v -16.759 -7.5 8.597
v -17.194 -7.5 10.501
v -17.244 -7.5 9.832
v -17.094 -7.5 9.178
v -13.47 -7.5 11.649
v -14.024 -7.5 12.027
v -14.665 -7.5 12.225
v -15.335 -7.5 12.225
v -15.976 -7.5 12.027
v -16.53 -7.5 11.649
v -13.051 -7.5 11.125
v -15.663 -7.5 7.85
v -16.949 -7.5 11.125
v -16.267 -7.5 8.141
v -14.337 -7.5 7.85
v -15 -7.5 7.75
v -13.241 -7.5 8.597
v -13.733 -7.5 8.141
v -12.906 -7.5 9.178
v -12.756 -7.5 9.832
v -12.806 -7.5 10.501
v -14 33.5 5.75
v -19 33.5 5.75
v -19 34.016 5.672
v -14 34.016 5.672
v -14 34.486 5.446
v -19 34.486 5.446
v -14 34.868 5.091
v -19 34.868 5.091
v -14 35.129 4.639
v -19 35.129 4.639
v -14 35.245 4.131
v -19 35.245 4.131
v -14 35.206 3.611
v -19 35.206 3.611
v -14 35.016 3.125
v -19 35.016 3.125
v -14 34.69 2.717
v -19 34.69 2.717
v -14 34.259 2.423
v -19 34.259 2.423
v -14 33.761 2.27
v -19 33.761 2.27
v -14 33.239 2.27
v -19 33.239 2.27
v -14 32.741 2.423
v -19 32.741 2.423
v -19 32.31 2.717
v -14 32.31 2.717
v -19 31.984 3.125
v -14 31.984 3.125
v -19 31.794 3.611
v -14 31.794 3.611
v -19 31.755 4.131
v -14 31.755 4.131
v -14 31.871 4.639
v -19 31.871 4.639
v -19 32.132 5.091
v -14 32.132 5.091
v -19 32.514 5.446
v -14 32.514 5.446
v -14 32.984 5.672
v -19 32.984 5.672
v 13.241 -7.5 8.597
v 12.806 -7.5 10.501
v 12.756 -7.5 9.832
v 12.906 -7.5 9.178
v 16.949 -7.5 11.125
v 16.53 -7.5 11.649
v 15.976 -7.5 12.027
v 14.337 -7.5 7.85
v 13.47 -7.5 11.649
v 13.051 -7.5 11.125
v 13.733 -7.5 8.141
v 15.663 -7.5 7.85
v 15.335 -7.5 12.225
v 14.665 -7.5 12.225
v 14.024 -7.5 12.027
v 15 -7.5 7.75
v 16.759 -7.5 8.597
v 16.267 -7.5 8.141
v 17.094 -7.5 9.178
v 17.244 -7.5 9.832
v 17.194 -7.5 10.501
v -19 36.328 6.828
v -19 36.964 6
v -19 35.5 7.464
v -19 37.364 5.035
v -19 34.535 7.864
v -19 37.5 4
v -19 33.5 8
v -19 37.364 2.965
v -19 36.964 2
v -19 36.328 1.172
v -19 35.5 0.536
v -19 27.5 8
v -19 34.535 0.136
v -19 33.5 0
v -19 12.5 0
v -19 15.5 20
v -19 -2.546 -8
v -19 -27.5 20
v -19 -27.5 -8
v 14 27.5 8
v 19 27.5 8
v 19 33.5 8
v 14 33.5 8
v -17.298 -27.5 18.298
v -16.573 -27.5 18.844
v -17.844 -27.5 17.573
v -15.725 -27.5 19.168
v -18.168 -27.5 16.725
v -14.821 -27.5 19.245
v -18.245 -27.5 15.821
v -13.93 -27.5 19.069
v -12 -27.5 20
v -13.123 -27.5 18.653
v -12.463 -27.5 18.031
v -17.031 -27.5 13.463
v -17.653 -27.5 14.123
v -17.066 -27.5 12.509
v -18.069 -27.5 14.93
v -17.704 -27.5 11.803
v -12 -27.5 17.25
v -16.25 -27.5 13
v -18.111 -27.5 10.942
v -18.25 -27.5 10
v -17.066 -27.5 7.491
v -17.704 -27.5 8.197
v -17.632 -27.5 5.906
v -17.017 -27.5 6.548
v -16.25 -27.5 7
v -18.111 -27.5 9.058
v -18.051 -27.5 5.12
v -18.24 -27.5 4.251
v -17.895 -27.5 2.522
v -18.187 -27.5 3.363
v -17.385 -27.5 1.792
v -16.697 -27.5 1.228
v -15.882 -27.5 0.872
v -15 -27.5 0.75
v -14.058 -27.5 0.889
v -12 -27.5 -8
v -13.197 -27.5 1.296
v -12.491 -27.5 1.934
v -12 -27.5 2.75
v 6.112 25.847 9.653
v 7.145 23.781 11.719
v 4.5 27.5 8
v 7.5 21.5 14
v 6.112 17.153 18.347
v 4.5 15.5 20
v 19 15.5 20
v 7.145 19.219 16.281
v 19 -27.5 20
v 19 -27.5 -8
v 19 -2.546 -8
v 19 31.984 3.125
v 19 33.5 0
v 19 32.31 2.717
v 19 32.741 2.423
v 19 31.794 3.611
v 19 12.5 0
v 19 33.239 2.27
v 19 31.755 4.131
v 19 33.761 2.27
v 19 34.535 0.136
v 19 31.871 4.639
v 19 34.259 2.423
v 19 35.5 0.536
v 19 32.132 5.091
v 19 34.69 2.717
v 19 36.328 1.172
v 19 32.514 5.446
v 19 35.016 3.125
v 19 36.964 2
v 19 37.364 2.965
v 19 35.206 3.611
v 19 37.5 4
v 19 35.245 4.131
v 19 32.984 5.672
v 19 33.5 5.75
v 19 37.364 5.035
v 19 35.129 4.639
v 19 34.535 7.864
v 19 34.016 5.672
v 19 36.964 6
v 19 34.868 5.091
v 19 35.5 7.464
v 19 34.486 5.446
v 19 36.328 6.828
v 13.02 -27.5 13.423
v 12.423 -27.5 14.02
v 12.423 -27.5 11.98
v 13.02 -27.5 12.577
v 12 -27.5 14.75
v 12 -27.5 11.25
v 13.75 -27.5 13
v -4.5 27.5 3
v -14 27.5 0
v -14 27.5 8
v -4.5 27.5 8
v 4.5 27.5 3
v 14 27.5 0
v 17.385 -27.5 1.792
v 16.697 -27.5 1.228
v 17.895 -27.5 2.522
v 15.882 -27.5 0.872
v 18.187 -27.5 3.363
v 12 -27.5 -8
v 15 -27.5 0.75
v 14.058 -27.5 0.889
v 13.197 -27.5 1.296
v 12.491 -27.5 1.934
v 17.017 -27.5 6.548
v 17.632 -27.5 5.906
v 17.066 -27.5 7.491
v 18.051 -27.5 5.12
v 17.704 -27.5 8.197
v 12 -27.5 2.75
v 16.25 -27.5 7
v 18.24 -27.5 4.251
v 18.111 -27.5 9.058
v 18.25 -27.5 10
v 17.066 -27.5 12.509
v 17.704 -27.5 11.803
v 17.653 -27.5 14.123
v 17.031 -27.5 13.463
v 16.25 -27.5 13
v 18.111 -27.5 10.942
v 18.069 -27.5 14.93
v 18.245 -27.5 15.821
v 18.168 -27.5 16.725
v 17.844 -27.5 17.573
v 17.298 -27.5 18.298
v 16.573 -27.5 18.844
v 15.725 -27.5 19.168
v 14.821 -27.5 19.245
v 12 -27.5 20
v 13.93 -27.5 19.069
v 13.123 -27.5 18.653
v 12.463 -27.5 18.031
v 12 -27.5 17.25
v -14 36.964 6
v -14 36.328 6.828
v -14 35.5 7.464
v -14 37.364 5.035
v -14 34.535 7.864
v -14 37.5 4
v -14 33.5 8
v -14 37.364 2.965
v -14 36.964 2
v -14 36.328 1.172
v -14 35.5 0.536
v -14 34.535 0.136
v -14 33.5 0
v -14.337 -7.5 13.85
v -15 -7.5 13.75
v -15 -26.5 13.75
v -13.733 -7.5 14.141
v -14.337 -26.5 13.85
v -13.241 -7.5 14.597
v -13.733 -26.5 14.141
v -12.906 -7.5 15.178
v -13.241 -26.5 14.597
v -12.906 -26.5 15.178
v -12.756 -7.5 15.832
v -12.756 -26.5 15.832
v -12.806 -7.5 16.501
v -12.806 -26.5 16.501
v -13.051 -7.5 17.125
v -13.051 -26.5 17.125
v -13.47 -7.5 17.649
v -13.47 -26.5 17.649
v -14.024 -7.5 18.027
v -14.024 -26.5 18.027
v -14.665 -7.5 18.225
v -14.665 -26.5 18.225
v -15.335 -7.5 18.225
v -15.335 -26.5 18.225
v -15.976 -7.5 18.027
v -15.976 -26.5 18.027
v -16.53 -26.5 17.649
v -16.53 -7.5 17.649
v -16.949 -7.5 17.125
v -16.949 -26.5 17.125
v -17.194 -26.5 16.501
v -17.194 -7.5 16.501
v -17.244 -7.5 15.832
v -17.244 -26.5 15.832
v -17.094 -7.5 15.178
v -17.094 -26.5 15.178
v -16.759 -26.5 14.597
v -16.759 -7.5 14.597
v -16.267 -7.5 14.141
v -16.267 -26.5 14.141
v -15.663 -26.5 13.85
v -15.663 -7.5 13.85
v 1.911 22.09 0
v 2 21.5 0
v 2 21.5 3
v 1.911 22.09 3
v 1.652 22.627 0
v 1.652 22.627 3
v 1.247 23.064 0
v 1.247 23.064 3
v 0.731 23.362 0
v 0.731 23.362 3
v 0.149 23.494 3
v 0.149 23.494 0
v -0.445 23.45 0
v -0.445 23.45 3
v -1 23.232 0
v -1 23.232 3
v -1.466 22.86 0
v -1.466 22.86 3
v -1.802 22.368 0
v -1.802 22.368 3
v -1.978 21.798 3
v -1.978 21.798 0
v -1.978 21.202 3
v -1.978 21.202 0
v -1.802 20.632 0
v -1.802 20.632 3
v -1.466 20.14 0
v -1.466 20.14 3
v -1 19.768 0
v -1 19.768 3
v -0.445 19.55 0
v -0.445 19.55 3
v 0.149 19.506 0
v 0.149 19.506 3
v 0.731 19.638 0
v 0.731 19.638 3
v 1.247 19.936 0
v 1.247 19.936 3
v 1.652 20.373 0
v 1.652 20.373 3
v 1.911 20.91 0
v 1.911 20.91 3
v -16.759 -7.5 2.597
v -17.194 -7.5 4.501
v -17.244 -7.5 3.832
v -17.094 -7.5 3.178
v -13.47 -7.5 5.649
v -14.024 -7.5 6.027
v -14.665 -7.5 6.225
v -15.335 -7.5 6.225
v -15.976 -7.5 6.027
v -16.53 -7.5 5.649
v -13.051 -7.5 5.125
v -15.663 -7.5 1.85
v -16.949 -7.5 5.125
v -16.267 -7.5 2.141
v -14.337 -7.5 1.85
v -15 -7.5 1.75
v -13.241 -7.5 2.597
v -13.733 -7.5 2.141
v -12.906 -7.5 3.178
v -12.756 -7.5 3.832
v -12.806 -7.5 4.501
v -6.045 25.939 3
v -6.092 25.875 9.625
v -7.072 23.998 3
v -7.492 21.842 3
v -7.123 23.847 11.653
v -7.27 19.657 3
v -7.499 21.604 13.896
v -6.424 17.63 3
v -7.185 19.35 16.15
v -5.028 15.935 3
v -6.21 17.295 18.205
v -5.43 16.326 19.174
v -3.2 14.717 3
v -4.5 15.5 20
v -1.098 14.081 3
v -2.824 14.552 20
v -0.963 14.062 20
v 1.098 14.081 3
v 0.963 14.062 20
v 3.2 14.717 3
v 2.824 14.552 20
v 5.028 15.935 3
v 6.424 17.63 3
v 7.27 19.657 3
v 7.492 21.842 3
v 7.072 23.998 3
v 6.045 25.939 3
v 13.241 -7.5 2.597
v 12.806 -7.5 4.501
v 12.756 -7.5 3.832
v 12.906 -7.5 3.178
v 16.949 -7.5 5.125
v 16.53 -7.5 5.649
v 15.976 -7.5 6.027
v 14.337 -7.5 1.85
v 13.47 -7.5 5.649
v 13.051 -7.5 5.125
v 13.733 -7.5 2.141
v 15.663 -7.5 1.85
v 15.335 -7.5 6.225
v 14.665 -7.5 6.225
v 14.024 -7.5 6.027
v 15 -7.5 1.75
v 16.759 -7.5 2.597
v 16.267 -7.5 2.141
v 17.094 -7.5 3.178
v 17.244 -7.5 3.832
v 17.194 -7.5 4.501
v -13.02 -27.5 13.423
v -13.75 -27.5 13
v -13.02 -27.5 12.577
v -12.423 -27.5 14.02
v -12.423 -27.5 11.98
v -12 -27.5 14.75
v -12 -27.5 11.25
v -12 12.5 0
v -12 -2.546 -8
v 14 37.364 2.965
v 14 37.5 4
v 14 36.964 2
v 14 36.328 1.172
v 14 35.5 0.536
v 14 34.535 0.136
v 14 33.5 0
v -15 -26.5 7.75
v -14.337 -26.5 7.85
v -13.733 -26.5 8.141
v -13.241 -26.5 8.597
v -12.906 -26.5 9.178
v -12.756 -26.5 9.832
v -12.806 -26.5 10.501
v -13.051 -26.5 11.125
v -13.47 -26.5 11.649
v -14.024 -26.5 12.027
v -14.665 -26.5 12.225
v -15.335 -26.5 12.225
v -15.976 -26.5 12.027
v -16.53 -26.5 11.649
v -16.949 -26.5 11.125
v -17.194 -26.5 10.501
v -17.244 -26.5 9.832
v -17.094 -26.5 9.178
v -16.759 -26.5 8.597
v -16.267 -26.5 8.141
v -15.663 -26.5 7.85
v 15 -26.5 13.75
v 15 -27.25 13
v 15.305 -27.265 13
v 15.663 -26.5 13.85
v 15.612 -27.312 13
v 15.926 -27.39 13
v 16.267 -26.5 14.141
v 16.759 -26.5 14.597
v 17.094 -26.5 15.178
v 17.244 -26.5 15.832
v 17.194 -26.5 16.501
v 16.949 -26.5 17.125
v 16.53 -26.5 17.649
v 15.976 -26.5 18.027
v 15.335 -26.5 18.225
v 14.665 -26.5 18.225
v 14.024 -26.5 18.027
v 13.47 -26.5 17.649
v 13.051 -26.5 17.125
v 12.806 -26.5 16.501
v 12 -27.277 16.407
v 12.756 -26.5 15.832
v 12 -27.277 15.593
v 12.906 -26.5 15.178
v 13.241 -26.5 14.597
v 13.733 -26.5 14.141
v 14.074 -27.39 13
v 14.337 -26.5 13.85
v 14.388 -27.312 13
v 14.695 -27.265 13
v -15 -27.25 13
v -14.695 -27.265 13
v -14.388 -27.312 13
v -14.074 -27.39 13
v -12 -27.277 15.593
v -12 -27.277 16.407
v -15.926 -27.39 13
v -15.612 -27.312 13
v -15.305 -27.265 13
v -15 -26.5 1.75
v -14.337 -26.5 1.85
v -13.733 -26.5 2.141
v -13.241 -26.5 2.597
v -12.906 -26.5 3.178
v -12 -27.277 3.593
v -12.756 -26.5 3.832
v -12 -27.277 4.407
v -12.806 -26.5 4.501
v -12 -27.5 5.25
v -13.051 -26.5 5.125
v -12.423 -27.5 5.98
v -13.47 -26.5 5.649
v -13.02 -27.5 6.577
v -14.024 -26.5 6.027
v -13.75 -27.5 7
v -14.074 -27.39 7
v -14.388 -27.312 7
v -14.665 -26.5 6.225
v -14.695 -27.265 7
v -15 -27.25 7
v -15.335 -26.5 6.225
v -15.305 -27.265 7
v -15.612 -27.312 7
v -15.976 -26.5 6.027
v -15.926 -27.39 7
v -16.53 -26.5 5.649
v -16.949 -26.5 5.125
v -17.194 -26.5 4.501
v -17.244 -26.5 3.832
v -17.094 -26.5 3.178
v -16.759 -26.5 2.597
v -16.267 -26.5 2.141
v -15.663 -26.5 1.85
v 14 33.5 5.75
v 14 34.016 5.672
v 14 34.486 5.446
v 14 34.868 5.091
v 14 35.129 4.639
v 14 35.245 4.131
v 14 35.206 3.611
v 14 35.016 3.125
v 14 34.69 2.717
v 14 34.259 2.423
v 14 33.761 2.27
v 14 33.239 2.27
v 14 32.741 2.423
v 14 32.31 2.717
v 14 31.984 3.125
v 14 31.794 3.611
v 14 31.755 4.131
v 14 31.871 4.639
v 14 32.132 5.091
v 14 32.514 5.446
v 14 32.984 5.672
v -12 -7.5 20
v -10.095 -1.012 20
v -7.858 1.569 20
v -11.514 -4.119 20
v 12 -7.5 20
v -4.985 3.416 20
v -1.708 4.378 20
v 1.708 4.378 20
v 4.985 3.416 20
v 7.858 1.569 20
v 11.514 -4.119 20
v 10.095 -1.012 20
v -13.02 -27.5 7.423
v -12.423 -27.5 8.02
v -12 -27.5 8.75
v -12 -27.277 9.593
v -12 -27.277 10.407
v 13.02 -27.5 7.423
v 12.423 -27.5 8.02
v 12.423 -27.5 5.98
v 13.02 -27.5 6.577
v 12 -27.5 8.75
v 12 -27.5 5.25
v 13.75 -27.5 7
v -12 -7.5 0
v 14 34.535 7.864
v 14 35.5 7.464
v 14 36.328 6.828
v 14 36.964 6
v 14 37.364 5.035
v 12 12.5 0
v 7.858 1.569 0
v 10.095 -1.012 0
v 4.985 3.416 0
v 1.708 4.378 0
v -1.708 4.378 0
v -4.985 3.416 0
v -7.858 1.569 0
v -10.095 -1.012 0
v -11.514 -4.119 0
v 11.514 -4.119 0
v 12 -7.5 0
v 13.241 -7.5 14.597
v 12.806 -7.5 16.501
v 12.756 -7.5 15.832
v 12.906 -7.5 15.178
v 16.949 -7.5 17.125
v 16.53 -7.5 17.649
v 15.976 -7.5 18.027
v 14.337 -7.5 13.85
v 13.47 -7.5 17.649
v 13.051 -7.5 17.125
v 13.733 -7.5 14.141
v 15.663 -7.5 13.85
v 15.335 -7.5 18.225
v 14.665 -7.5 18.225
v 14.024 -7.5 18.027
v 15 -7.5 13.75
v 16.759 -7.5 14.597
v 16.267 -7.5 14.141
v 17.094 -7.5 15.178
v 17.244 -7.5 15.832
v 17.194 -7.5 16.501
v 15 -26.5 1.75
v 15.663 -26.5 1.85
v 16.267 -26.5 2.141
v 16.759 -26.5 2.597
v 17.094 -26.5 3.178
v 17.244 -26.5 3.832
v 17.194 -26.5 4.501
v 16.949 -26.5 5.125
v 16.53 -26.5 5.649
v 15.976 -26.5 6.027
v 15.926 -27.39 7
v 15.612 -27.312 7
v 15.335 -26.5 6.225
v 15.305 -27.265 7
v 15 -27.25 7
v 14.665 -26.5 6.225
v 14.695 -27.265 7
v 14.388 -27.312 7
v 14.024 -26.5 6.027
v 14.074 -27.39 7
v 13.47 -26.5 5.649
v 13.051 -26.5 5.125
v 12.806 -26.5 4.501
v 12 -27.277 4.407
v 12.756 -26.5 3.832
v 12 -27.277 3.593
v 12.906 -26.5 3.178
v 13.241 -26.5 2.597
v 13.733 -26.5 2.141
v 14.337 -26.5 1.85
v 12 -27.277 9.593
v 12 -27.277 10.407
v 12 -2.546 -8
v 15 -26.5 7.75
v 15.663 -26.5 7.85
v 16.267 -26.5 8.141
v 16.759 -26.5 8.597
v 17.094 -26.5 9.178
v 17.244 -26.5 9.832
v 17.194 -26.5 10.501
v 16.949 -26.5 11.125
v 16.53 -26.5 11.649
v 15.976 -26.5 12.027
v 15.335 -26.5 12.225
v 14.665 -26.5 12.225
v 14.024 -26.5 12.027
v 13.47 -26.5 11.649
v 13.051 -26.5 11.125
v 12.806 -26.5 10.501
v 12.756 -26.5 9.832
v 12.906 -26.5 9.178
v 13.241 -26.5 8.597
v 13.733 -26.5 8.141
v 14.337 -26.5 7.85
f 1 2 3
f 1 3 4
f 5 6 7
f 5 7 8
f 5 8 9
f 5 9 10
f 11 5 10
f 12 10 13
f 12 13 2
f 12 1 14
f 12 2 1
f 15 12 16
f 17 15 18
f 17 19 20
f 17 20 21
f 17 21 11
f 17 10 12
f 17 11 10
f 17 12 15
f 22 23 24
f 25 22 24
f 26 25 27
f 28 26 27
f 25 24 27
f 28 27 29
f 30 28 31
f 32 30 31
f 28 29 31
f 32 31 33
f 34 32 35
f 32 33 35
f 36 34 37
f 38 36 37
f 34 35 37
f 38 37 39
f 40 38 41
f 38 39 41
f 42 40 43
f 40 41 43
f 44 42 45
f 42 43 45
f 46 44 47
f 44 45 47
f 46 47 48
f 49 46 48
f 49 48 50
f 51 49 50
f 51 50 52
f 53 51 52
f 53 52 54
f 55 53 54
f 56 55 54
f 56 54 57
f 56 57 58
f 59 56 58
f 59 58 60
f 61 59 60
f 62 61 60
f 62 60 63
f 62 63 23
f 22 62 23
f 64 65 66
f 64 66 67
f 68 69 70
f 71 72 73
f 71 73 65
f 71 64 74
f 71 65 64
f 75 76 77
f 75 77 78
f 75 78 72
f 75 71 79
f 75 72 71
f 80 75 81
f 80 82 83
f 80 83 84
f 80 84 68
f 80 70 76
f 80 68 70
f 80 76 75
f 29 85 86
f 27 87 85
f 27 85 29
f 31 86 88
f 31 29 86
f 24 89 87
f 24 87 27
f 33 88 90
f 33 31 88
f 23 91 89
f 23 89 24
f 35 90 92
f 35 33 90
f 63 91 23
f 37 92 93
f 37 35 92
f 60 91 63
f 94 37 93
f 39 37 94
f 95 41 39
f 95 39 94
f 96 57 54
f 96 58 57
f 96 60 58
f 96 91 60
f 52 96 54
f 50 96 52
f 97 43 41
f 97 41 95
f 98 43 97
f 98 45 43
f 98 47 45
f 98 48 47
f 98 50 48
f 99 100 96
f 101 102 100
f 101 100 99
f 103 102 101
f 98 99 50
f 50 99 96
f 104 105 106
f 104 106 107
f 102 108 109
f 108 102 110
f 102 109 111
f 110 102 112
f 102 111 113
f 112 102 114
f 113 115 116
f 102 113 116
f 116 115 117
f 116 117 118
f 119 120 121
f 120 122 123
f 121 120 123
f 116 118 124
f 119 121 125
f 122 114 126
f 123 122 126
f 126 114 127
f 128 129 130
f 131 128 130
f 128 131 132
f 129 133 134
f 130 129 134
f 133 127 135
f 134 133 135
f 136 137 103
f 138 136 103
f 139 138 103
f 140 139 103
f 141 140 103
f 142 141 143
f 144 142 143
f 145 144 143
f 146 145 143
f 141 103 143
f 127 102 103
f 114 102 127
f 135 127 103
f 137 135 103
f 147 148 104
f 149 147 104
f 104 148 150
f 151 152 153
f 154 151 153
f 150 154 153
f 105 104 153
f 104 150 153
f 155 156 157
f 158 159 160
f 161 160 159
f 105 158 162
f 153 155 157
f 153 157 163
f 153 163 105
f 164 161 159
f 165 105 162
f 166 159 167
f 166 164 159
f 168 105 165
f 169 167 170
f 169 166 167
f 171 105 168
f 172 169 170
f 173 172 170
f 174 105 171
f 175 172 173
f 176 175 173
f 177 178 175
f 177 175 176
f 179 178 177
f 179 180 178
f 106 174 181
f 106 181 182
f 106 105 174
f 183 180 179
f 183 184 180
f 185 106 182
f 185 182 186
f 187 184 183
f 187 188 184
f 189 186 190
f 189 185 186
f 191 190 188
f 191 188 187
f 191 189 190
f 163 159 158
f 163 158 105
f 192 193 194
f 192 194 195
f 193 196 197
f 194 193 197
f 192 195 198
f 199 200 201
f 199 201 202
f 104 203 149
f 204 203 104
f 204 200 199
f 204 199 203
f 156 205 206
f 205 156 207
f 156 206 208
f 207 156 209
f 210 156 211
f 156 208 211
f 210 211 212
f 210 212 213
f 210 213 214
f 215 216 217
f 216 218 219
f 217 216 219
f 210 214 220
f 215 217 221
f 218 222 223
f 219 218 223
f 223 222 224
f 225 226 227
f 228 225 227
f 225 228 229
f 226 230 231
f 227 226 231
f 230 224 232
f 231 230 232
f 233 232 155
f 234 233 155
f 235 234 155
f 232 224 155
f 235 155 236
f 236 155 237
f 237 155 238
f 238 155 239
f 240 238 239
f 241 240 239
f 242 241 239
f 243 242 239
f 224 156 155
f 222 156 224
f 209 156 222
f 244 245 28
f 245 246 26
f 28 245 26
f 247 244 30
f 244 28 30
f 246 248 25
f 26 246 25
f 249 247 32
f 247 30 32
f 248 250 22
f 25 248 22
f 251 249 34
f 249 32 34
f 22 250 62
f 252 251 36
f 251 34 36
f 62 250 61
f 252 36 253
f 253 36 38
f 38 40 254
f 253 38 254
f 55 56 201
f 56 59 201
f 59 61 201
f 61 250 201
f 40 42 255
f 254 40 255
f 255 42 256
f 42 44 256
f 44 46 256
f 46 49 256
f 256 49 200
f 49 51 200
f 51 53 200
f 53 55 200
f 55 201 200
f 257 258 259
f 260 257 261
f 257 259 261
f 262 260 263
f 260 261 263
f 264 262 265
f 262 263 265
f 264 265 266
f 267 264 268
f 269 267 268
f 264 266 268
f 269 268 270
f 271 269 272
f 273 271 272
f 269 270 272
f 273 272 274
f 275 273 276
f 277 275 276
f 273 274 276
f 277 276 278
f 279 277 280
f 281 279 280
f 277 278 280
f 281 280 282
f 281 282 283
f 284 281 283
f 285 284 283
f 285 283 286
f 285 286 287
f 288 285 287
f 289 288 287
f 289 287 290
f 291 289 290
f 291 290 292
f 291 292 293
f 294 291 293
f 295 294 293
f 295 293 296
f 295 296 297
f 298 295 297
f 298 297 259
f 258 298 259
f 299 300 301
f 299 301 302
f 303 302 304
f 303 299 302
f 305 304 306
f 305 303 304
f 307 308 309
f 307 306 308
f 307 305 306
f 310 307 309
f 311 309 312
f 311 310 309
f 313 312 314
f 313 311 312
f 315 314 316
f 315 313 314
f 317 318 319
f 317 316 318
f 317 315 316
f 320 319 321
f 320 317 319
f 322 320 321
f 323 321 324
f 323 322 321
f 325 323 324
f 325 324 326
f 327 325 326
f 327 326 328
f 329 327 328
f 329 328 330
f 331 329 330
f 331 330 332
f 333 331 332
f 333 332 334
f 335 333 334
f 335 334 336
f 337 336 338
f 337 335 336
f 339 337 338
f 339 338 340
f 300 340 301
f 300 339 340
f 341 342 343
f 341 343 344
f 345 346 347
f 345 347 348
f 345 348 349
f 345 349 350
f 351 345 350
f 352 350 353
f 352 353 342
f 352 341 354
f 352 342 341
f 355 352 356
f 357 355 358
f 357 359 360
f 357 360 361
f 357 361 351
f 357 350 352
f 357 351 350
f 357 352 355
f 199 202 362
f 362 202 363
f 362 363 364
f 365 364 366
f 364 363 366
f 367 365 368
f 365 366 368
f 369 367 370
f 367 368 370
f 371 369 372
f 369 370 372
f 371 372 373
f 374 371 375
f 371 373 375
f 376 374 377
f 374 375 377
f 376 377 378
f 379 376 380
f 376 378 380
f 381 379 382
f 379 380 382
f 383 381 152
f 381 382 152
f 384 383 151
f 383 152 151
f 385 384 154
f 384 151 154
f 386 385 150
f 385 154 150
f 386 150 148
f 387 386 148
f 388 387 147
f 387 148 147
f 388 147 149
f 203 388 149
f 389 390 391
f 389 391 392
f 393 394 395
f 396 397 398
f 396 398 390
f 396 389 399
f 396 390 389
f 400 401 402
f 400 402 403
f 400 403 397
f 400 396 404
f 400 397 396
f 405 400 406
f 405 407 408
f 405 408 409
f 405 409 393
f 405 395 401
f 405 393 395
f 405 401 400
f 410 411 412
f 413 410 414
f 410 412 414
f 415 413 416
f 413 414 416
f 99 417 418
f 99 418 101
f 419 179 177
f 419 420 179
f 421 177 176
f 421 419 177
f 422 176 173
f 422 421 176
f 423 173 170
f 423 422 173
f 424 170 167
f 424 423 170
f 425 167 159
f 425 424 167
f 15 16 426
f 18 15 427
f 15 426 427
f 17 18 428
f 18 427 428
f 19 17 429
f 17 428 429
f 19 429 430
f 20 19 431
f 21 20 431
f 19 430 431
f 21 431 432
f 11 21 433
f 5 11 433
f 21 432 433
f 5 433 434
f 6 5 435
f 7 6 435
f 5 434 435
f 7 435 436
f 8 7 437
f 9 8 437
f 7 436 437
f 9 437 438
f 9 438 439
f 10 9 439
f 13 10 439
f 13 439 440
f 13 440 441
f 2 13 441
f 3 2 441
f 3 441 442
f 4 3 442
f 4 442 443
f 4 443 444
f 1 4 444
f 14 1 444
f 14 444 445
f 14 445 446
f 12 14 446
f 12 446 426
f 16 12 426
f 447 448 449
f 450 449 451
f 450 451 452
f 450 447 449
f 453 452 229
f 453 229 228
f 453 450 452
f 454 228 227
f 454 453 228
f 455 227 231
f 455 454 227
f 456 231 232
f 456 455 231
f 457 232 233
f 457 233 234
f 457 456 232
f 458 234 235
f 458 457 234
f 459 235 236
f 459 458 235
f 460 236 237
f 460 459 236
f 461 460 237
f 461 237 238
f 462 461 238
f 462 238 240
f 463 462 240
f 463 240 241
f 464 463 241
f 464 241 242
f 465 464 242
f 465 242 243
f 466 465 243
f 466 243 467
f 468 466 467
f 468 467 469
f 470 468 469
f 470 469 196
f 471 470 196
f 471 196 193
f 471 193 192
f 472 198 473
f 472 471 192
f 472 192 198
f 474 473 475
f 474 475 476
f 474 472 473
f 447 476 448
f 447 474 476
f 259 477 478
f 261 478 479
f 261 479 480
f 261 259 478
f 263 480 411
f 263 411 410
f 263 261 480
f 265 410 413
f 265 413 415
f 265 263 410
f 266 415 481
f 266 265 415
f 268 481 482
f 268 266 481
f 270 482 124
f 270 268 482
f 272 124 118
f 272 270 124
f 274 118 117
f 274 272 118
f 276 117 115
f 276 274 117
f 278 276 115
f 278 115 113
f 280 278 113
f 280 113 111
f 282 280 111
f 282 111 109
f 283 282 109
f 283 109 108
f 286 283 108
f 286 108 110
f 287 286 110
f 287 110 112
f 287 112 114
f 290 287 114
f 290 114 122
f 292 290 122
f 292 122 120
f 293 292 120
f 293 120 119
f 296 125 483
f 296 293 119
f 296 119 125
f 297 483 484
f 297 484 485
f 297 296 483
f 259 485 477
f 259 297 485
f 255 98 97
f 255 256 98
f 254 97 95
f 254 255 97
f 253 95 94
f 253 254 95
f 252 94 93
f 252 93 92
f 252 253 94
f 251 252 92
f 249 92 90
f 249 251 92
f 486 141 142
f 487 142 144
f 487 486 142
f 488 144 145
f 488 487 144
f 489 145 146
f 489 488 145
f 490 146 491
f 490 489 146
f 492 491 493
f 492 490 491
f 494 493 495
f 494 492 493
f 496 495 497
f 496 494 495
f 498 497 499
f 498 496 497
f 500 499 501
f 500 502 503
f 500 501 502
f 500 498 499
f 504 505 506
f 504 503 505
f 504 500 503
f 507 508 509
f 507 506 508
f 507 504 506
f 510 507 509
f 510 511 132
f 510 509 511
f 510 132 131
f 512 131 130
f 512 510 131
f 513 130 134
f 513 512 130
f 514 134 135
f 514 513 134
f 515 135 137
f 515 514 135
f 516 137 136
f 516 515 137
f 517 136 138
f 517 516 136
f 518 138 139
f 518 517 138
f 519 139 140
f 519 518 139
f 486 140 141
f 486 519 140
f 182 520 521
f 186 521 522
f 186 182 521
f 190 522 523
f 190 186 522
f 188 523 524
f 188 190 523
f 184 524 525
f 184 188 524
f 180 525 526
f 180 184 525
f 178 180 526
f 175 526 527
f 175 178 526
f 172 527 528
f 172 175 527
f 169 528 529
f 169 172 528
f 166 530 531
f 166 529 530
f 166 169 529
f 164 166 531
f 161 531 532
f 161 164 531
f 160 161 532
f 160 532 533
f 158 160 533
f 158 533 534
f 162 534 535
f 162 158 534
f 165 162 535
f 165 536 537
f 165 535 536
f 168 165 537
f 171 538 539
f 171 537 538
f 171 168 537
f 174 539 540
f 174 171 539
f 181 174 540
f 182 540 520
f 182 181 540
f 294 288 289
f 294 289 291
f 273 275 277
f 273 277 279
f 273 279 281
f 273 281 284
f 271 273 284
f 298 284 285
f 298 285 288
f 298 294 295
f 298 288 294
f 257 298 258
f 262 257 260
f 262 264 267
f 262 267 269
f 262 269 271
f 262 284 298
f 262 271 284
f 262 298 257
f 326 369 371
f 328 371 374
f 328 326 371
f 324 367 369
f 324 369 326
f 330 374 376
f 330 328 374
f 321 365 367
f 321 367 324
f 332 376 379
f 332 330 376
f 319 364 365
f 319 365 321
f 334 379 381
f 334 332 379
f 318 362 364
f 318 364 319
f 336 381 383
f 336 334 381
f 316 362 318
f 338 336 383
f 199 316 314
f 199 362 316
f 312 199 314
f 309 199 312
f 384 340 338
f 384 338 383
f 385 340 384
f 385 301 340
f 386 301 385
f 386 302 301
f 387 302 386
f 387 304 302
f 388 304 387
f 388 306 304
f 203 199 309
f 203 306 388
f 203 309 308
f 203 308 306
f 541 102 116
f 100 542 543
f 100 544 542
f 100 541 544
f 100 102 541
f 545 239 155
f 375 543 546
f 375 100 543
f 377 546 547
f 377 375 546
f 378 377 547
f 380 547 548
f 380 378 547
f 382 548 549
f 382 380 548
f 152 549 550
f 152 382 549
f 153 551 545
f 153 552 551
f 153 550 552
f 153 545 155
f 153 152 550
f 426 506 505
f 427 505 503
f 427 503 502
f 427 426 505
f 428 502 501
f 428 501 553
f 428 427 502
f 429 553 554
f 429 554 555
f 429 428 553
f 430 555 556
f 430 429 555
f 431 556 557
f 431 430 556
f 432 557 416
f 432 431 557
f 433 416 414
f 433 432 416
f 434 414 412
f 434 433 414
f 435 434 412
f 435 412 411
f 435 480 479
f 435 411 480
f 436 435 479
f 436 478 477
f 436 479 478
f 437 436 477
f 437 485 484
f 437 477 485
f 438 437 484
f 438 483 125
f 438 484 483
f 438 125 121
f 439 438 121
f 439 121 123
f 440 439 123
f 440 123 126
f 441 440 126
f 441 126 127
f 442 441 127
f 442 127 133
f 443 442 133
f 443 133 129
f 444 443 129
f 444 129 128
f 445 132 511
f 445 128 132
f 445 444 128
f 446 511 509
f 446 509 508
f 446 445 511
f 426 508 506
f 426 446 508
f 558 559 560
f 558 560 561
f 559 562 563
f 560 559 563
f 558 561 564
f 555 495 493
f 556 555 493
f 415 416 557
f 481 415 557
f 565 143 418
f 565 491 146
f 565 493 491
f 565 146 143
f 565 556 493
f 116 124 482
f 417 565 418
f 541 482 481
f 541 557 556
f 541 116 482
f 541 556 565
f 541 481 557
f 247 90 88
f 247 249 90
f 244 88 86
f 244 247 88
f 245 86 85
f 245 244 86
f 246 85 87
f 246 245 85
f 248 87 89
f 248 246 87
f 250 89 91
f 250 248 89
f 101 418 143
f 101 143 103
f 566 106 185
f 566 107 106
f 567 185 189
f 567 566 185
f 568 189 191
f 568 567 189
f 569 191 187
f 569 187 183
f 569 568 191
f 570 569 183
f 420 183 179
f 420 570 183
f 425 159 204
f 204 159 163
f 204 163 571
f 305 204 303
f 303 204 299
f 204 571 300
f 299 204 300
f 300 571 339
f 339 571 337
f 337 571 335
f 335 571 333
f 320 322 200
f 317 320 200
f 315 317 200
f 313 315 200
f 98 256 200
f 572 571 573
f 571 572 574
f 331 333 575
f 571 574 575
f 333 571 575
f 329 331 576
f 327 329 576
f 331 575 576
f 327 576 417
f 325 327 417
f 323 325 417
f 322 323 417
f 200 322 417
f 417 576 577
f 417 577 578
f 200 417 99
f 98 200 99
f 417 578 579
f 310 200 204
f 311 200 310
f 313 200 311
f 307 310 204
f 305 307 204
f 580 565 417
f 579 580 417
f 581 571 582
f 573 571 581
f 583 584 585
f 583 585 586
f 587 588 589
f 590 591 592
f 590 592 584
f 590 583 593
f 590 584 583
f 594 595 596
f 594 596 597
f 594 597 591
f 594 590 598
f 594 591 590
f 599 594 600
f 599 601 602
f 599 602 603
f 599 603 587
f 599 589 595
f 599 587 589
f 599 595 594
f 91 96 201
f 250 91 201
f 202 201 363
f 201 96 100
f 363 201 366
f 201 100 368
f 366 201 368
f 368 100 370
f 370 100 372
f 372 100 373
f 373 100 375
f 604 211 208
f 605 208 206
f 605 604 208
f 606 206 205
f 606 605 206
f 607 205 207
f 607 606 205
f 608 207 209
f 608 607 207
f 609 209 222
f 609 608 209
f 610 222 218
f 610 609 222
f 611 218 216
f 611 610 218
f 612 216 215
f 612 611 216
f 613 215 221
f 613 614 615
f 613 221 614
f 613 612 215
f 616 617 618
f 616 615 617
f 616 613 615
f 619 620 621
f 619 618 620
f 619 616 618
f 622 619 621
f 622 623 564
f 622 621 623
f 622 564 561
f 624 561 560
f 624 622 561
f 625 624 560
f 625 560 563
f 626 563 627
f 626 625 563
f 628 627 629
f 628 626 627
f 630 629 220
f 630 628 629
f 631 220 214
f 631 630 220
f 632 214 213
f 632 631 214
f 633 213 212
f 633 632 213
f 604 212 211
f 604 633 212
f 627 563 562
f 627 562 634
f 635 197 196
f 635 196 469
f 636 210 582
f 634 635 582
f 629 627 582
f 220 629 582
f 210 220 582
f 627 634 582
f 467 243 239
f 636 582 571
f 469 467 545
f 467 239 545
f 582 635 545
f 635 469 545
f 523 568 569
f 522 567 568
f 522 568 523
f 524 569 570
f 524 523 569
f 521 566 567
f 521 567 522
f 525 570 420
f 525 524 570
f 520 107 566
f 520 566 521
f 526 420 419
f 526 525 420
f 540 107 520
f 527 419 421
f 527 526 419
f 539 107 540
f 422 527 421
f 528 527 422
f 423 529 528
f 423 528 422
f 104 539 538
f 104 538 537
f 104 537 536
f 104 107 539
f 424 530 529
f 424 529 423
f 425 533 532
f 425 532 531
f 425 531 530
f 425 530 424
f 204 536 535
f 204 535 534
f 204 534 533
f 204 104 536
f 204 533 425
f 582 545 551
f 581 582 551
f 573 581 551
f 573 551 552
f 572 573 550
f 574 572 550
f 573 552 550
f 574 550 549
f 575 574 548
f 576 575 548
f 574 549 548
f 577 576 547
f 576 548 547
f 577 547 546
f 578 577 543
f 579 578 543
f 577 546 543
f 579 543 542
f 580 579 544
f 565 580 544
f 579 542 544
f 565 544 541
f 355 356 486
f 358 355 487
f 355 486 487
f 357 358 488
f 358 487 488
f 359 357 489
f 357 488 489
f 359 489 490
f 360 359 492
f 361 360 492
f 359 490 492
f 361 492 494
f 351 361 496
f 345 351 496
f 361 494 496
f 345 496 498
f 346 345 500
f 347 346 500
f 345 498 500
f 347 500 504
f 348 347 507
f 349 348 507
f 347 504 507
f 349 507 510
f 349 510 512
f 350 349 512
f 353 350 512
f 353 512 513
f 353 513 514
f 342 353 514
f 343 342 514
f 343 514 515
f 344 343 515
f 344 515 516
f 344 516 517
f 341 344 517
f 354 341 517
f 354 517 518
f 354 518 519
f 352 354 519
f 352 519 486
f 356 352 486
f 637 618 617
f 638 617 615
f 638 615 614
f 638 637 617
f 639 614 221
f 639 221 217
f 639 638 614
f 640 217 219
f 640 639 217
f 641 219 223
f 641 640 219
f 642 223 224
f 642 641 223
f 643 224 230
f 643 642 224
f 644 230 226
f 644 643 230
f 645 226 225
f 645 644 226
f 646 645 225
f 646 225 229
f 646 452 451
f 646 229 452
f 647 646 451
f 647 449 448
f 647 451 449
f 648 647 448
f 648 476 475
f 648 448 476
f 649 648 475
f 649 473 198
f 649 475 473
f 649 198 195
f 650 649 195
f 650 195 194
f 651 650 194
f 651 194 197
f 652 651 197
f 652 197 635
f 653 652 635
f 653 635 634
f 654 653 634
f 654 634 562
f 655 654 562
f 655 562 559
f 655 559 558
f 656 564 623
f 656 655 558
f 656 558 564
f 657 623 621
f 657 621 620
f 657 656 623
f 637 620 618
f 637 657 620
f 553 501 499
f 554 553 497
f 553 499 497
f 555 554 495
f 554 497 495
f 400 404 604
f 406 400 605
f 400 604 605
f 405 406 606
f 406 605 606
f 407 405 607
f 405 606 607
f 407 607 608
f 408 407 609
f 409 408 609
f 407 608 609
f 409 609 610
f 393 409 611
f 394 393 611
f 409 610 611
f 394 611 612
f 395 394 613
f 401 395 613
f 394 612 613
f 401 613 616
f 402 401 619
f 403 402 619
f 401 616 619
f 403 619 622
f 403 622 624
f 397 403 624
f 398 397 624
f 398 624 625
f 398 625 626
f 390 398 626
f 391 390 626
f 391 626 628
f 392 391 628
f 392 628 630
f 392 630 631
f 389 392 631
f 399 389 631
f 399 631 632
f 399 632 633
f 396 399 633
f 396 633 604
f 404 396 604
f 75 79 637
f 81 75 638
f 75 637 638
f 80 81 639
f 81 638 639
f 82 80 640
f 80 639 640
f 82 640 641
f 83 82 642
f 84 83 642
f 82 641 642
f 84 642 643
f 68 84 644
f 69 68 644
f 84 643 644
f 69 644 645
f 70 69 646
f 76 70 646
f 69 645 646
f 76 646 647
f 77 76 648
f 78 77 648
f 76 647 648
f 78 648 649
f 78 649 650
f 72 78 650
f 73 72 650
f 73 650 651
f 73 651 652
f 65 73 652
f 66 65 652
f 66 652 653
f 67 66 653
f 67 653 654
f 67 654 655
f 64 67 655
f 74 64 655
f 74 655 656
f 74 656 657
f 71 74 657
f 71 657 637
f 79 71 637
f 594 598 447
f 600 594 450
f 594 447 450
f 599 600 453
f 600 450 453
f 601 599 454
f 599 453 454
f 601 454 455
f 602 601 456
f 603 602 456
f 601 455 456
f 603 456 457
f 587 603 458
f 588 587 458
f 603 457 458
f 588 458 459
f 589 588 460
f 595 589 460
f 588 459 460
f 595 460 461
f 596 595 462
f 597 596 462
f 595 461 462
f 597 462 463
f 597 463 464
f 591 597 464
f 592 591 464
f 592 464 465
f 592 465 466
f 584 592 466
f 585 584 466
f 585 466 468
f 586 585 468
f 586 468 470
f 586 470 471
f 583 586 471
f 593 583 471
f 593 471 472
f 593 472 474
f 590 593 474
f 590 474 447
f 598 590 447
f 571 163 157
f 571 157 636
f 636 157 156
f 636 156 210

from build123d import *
from OCP.BRepFilletAPI import BRepFilletAPI_MakeChamfer

# Parameters (mm, degrees)
SKETCH1_W               = 38
SKETCH1_H               = 55
BOSS_EXTRUDE1_DEPTH     = 20
CUT_EXTRUDE1_DEPTH      = 39.951893407
SKETCH3_R               = 2.25
CUT_EXTRUDE2_DEPTH      = 20
LPATTERN1_COUNT         = 3
LPATTERN1_PITCH         = 6
CHAMFER1_SIZE           = 12
SKETCH4_W               = 5
SKETCH4_H               = 8
BOSS_EXTRUDE2_DEPTH     = 10
FILLET1_R               = 4
SKETCH5_R               = 1.75
CUT_EXTRUDE3_DEPTH      = 58.010963858
FILLET1_OF_MIRROR1_R    = 4
CHAMFER2_SIZE           = 1
SKETCH6_R               = 7.5
CUT_EXTRUDE4_DEPTH      = 17
CUT_EXTRUDE5_DEPTH      = 46.345892868
CUT_EXTRUDE5_DEPTH_BACK = 46.345892868
SKETCH7_R               = 2
SKETCH8_W               = 7
SKETCH8_H               = 40
BOSS_EXTRUDE3_DEPTH     = 8
CHAMFER3_SIZE           = 15.045811723
CHAMFER3_SIZE_2         = 8


# Some blends are built 0.0001 mm under size
with BuildPart() as part:
    # Sketch1 → Boss-Extrude1 (new body)
    with BuildSketch(Plane.XY):
        Rectangle(SKETCH1_W, SKETCH1_H)
    extrude(amount=BOSS_EXTRUDE1_DEPTH)

    # Sketch2 → Cut-Extrude1 (cut, through all)
    with BuildSketch(Plane.XY.offset(20)):
        with BuildLine():
            Line((-12, -27.5), (12, -27.5))
            Line((12, -27.5), (12, -7.5))
            ThreePointArc((12, -7.5), (0, 4.5), (-12, -7.5))
            Line((-12, -7.5), (-12, -27.5))
        make_face()
    extrude(amount=-CUT_EXTRUDE1_DEPTH, mode=Mode.SUBTRACT)

    # Sketch3 → Cut-Extrude2 (cut)
    with BuildSketch(Plane.XZ.offset(27.5)):
        with Locations(Location((-15, 16, 0), (0, 0, 270))):
            Circle(SKETCH3_R)
        with Locations(Location((15, 16, 0), (0, 0, 270))):
            Circle(SKETCH3_R)
    cut_extrude2 = extrude(amount=-CUT_EXTRUDE2_DEPTH, mode=Mode.SUBTRACT)

    # LPattern1: Cut-Extrude2 ×3
    with Locations(*[(0, 0, -i * LPATTERN1_PITCH) for i in range(1, LPATTERN1_COUNT)]):
        add(cut_extrude2, mode=Mode.SUBTRACT)

    # Chamfer1
    chamfer1_edges = [part.edges().sort_by_distance(p)[0] for p in [
        (0, 27.5, 20),
    ]]
    chamfer(chamfer1_edges, length=CHAMFER1_SIZE)

    # Sketch4 → Boss-Extrude2 (add)
    with BuildSketch(Plane(origin=(0, 27.5, 0), x_dir=(1, 0, 0), z_dir=(0, 1, 0))):
        with Locations((-16.5, -4)):
            Rectangle(SKETCH4_W, SKETCH4_H)
    boss_extrude2 = extrude(amount=BOSS_EXTRUDE2_DEPTH)

    # Fillet1
    fillet1_edges = [part.edges().sort_by_distance(p)[0] for p in [
        (-16.5, 37.5, 0),
        (-16.5, 37.5, 8),
    ]]
    fillet(fillet1_edges, radius=FILLET1_R - 0.0001)  # a hair under: the kernel refuses the full size

    # Sketch5 → Cut-Extrude3 (cut, through all)
    with BuildSketch(Plane.ZY.offset(19)):
        with Locations((4, 33.5)):
            Circle(SKETCH5_R)
    cut_extrude3 = extrude(amount=-CUT_EXTRUDE3_DEPTH, mode=Mode.SUBTRACT)

    # Mirror1: Boss-Extrude2, Cut-Extrude3 across plane
    add(boss_extrude2.mirror(Plane(origin=(0, 0, 0), x_dir=(0, 0, 1), z_dir=(1, 0, 0))))
    add(cut_extrude3.mirror(Plane(origin=(0, 0, 0), x_dir=(0, 0, 1), z_dir=(1, 0, 0))), mode=Mode.SUBTRACT)

    # Fillet1 of Mirror1
    fillet1_of_mirror1_edges = [part.edges().sort_by_distance(p)[0] for p in [
        (16.5, 37.5, 0),
        (16.5, 37.5, 8),
    ]]
    fillet(fillet1_of_mirror1_edges, radius=FILLET1_OF_MIRROR1_R - 0.0001)  # a hair under: the kernel refuses the full size

    # Chamfer2
    # the kernel refuses this chamfer: 1 mm, written as the material it takes off along each edge
    with BuildSketch(Plane(origin=(-15, -27.5, 16), x_dir=(0, 0, -1), z_dir=(-1, 0, 0))) as chamfer2_piece_1:
        Polygon((2.25 + CHAMFER2_SIZE, 0), (2.25, -CHAMFER2_SIZE), (2.25, 0), align=None)
    revolve(axis=Axis((-15, -27.5, 16), (0, -1, 0)), mode=Mode.SUBTRACT)
    with BuildSketch(Plane(origin=(15, -27.5, 16), x_dir=(0, 0, -1), z_dir=(-1, 0, 0))) as chamfer2_piece_2:
        Polygon((2.25 + CHAMFER2_SIZE, 0), (2.25, -CHAMFER2_SIZE), (2.25, 0), align=None)
    revolve(axis=Axis((15, -27.5, 16), (0, -1, 0)), mode=Mode.SUBTRACT)
    with BuildSketch(Plane(origin=(-15, -27.5, 10), x_dir=(0, 0, -1), z_dir=(-1, 0, 0))) as chamfer2_piece_3:
        Polygon((2.25 + CHAMFER2_SIZE, 0), (2.25, -CHAMFER2_SIZE), (2.25, 0), align=None)
    revolve(axis=Axis((-15, -27.5, 10), (0, -1, 0)), mode=Mode.SUBTRACT)
    with BuildSketch(Plane(origin=(-15, -27.5, 4), x_dir=(0, 0, -1), z_dir=(-1, 0, 0))) as chamfer2_piece_4:
        Polygon((2.25 + CHAMFER2_SIZE, 0), (2.25, -CHAMFER2_SIZE), (2.25, 0), align=None)
    revolve(axis=Axis((-15, -27.5, 4), (0, -1, 0)), mode=Mode.SUBTRACT)
    with BuildSketch(Plane(origin=(15, -27.5, 10), x_dir=(0, 0, -1), z_dir=(-1, 0, 0))) as chamfer2_piece_5:
        Polygon((2.25 + CHAMFER2_SIZE, 0), (2.25, -CHAMFER2_SIZE), (2.25, 0), align=None)
    revolve(axis=Axis((15, -27.5, 10), (0, -1, 0)), mode=Mode.SUBTRACT)
    with BuildSketch(Plane(origin=(15, -27.5, 4), x_dir=(0, 0, -1), z_dir=(-1, 0, 0))) as chamfer2_piece_6:
        Polygon((2.25 + CHAMFER2_SIZE, 0), (2.25, -CHAMFER2_SIZE), (2.25, 0), align=None)
    revolve(axis=Axis((15, -27.5, 4), (0, -1, 0)), mode=Mode.SUBTRACT)

    # Sketch6 → Cut-Extrude4 (cut)
    with BuildSketch(Plane.XY.offset(20)):
        with Locations((0, 21.5)):
            Circle(SKETCH6_R)
    extrude(amount=-CUT_EXTRUDE4_DEPTH, mode=Mode.SUBTRACT)

    # Sketch7 → Cut-Extrude5 (cut, two sides: drawn at the far end of the back side and taken through both)
    with BuildSketch(Plane.XY.offset(3).offset(-CUT_EXTRUDE5_DEPTH_BACK)):
        with Locations((0, 21.5)):
            Circle(SKETCH7_R)
    extrude(amount=CUT_EXTRUDE5_DEPTH + CUT_EXTRUDE5_DEPTH_BACK, mode=Mode.SUBTRACT)

    # Sketch8 → Boss-Extrude3 (add)
    with BuildSketch(Plane(origin=(0, 0, 0), x_dir=(-1, 0, 0), z_dir=(0, 0, -1))):
        with Locations((-15.5, -7.5)):
            Rectangle(SKETCH8_W, SKETCH8_H)
        with Locations((15.5, -7.5)):
            Rectangle(SKETCH8_W, SKETCH8_H)
    extrude(amount=BOSS_EXTRUDE3_DEPTH)

    # Chamfer3
    chamfer3_edges_1 = [part.edges().sort_by_distance(p)[0] for p in [
        (-15.5, 12.5, -8),
    ]]
    chamfer3_side_1 = [part.faces().sort_by_distance(p)[0] for p in [
        (-15.5, 12.34, -8),
    ]]
    chamfer3_edges_2 = [part.edges().sort_by_distance(p)[0] for p in [
        (15.5, 12.5, -8),
    ]]
    chamfer3_side_2 = [part.faces().sort_by_distance(p)[0] for p in [
        (15.5, 12.34, -8),
    ]]
    chamfer3 = BRepFilletAPI_MakeChamfer(part.part.solid().wrapped)
    for e in chamfer3_edges_1:
        chamfer3.Add(CHAMFER3_SIZE - 0.0001, CHAMFER3_SIZE_2 - 0.0001, e.wrapped, chamfer3_side_1[0].wrapped)
    for e in chamfer3_edges_2:
        chamfer3.Add(CHAMFER3_SIZE - 0.0001, CHAMFER3_SIZE_2 - 0.0001, e.wrapped, chamfer3_side_2[0].wrapped)
    add(Compound.cast(chamfer3.Shape()), mode=Mode.REPLACE)  # a hair under: the kernel refuses the full size


solid = part.part
